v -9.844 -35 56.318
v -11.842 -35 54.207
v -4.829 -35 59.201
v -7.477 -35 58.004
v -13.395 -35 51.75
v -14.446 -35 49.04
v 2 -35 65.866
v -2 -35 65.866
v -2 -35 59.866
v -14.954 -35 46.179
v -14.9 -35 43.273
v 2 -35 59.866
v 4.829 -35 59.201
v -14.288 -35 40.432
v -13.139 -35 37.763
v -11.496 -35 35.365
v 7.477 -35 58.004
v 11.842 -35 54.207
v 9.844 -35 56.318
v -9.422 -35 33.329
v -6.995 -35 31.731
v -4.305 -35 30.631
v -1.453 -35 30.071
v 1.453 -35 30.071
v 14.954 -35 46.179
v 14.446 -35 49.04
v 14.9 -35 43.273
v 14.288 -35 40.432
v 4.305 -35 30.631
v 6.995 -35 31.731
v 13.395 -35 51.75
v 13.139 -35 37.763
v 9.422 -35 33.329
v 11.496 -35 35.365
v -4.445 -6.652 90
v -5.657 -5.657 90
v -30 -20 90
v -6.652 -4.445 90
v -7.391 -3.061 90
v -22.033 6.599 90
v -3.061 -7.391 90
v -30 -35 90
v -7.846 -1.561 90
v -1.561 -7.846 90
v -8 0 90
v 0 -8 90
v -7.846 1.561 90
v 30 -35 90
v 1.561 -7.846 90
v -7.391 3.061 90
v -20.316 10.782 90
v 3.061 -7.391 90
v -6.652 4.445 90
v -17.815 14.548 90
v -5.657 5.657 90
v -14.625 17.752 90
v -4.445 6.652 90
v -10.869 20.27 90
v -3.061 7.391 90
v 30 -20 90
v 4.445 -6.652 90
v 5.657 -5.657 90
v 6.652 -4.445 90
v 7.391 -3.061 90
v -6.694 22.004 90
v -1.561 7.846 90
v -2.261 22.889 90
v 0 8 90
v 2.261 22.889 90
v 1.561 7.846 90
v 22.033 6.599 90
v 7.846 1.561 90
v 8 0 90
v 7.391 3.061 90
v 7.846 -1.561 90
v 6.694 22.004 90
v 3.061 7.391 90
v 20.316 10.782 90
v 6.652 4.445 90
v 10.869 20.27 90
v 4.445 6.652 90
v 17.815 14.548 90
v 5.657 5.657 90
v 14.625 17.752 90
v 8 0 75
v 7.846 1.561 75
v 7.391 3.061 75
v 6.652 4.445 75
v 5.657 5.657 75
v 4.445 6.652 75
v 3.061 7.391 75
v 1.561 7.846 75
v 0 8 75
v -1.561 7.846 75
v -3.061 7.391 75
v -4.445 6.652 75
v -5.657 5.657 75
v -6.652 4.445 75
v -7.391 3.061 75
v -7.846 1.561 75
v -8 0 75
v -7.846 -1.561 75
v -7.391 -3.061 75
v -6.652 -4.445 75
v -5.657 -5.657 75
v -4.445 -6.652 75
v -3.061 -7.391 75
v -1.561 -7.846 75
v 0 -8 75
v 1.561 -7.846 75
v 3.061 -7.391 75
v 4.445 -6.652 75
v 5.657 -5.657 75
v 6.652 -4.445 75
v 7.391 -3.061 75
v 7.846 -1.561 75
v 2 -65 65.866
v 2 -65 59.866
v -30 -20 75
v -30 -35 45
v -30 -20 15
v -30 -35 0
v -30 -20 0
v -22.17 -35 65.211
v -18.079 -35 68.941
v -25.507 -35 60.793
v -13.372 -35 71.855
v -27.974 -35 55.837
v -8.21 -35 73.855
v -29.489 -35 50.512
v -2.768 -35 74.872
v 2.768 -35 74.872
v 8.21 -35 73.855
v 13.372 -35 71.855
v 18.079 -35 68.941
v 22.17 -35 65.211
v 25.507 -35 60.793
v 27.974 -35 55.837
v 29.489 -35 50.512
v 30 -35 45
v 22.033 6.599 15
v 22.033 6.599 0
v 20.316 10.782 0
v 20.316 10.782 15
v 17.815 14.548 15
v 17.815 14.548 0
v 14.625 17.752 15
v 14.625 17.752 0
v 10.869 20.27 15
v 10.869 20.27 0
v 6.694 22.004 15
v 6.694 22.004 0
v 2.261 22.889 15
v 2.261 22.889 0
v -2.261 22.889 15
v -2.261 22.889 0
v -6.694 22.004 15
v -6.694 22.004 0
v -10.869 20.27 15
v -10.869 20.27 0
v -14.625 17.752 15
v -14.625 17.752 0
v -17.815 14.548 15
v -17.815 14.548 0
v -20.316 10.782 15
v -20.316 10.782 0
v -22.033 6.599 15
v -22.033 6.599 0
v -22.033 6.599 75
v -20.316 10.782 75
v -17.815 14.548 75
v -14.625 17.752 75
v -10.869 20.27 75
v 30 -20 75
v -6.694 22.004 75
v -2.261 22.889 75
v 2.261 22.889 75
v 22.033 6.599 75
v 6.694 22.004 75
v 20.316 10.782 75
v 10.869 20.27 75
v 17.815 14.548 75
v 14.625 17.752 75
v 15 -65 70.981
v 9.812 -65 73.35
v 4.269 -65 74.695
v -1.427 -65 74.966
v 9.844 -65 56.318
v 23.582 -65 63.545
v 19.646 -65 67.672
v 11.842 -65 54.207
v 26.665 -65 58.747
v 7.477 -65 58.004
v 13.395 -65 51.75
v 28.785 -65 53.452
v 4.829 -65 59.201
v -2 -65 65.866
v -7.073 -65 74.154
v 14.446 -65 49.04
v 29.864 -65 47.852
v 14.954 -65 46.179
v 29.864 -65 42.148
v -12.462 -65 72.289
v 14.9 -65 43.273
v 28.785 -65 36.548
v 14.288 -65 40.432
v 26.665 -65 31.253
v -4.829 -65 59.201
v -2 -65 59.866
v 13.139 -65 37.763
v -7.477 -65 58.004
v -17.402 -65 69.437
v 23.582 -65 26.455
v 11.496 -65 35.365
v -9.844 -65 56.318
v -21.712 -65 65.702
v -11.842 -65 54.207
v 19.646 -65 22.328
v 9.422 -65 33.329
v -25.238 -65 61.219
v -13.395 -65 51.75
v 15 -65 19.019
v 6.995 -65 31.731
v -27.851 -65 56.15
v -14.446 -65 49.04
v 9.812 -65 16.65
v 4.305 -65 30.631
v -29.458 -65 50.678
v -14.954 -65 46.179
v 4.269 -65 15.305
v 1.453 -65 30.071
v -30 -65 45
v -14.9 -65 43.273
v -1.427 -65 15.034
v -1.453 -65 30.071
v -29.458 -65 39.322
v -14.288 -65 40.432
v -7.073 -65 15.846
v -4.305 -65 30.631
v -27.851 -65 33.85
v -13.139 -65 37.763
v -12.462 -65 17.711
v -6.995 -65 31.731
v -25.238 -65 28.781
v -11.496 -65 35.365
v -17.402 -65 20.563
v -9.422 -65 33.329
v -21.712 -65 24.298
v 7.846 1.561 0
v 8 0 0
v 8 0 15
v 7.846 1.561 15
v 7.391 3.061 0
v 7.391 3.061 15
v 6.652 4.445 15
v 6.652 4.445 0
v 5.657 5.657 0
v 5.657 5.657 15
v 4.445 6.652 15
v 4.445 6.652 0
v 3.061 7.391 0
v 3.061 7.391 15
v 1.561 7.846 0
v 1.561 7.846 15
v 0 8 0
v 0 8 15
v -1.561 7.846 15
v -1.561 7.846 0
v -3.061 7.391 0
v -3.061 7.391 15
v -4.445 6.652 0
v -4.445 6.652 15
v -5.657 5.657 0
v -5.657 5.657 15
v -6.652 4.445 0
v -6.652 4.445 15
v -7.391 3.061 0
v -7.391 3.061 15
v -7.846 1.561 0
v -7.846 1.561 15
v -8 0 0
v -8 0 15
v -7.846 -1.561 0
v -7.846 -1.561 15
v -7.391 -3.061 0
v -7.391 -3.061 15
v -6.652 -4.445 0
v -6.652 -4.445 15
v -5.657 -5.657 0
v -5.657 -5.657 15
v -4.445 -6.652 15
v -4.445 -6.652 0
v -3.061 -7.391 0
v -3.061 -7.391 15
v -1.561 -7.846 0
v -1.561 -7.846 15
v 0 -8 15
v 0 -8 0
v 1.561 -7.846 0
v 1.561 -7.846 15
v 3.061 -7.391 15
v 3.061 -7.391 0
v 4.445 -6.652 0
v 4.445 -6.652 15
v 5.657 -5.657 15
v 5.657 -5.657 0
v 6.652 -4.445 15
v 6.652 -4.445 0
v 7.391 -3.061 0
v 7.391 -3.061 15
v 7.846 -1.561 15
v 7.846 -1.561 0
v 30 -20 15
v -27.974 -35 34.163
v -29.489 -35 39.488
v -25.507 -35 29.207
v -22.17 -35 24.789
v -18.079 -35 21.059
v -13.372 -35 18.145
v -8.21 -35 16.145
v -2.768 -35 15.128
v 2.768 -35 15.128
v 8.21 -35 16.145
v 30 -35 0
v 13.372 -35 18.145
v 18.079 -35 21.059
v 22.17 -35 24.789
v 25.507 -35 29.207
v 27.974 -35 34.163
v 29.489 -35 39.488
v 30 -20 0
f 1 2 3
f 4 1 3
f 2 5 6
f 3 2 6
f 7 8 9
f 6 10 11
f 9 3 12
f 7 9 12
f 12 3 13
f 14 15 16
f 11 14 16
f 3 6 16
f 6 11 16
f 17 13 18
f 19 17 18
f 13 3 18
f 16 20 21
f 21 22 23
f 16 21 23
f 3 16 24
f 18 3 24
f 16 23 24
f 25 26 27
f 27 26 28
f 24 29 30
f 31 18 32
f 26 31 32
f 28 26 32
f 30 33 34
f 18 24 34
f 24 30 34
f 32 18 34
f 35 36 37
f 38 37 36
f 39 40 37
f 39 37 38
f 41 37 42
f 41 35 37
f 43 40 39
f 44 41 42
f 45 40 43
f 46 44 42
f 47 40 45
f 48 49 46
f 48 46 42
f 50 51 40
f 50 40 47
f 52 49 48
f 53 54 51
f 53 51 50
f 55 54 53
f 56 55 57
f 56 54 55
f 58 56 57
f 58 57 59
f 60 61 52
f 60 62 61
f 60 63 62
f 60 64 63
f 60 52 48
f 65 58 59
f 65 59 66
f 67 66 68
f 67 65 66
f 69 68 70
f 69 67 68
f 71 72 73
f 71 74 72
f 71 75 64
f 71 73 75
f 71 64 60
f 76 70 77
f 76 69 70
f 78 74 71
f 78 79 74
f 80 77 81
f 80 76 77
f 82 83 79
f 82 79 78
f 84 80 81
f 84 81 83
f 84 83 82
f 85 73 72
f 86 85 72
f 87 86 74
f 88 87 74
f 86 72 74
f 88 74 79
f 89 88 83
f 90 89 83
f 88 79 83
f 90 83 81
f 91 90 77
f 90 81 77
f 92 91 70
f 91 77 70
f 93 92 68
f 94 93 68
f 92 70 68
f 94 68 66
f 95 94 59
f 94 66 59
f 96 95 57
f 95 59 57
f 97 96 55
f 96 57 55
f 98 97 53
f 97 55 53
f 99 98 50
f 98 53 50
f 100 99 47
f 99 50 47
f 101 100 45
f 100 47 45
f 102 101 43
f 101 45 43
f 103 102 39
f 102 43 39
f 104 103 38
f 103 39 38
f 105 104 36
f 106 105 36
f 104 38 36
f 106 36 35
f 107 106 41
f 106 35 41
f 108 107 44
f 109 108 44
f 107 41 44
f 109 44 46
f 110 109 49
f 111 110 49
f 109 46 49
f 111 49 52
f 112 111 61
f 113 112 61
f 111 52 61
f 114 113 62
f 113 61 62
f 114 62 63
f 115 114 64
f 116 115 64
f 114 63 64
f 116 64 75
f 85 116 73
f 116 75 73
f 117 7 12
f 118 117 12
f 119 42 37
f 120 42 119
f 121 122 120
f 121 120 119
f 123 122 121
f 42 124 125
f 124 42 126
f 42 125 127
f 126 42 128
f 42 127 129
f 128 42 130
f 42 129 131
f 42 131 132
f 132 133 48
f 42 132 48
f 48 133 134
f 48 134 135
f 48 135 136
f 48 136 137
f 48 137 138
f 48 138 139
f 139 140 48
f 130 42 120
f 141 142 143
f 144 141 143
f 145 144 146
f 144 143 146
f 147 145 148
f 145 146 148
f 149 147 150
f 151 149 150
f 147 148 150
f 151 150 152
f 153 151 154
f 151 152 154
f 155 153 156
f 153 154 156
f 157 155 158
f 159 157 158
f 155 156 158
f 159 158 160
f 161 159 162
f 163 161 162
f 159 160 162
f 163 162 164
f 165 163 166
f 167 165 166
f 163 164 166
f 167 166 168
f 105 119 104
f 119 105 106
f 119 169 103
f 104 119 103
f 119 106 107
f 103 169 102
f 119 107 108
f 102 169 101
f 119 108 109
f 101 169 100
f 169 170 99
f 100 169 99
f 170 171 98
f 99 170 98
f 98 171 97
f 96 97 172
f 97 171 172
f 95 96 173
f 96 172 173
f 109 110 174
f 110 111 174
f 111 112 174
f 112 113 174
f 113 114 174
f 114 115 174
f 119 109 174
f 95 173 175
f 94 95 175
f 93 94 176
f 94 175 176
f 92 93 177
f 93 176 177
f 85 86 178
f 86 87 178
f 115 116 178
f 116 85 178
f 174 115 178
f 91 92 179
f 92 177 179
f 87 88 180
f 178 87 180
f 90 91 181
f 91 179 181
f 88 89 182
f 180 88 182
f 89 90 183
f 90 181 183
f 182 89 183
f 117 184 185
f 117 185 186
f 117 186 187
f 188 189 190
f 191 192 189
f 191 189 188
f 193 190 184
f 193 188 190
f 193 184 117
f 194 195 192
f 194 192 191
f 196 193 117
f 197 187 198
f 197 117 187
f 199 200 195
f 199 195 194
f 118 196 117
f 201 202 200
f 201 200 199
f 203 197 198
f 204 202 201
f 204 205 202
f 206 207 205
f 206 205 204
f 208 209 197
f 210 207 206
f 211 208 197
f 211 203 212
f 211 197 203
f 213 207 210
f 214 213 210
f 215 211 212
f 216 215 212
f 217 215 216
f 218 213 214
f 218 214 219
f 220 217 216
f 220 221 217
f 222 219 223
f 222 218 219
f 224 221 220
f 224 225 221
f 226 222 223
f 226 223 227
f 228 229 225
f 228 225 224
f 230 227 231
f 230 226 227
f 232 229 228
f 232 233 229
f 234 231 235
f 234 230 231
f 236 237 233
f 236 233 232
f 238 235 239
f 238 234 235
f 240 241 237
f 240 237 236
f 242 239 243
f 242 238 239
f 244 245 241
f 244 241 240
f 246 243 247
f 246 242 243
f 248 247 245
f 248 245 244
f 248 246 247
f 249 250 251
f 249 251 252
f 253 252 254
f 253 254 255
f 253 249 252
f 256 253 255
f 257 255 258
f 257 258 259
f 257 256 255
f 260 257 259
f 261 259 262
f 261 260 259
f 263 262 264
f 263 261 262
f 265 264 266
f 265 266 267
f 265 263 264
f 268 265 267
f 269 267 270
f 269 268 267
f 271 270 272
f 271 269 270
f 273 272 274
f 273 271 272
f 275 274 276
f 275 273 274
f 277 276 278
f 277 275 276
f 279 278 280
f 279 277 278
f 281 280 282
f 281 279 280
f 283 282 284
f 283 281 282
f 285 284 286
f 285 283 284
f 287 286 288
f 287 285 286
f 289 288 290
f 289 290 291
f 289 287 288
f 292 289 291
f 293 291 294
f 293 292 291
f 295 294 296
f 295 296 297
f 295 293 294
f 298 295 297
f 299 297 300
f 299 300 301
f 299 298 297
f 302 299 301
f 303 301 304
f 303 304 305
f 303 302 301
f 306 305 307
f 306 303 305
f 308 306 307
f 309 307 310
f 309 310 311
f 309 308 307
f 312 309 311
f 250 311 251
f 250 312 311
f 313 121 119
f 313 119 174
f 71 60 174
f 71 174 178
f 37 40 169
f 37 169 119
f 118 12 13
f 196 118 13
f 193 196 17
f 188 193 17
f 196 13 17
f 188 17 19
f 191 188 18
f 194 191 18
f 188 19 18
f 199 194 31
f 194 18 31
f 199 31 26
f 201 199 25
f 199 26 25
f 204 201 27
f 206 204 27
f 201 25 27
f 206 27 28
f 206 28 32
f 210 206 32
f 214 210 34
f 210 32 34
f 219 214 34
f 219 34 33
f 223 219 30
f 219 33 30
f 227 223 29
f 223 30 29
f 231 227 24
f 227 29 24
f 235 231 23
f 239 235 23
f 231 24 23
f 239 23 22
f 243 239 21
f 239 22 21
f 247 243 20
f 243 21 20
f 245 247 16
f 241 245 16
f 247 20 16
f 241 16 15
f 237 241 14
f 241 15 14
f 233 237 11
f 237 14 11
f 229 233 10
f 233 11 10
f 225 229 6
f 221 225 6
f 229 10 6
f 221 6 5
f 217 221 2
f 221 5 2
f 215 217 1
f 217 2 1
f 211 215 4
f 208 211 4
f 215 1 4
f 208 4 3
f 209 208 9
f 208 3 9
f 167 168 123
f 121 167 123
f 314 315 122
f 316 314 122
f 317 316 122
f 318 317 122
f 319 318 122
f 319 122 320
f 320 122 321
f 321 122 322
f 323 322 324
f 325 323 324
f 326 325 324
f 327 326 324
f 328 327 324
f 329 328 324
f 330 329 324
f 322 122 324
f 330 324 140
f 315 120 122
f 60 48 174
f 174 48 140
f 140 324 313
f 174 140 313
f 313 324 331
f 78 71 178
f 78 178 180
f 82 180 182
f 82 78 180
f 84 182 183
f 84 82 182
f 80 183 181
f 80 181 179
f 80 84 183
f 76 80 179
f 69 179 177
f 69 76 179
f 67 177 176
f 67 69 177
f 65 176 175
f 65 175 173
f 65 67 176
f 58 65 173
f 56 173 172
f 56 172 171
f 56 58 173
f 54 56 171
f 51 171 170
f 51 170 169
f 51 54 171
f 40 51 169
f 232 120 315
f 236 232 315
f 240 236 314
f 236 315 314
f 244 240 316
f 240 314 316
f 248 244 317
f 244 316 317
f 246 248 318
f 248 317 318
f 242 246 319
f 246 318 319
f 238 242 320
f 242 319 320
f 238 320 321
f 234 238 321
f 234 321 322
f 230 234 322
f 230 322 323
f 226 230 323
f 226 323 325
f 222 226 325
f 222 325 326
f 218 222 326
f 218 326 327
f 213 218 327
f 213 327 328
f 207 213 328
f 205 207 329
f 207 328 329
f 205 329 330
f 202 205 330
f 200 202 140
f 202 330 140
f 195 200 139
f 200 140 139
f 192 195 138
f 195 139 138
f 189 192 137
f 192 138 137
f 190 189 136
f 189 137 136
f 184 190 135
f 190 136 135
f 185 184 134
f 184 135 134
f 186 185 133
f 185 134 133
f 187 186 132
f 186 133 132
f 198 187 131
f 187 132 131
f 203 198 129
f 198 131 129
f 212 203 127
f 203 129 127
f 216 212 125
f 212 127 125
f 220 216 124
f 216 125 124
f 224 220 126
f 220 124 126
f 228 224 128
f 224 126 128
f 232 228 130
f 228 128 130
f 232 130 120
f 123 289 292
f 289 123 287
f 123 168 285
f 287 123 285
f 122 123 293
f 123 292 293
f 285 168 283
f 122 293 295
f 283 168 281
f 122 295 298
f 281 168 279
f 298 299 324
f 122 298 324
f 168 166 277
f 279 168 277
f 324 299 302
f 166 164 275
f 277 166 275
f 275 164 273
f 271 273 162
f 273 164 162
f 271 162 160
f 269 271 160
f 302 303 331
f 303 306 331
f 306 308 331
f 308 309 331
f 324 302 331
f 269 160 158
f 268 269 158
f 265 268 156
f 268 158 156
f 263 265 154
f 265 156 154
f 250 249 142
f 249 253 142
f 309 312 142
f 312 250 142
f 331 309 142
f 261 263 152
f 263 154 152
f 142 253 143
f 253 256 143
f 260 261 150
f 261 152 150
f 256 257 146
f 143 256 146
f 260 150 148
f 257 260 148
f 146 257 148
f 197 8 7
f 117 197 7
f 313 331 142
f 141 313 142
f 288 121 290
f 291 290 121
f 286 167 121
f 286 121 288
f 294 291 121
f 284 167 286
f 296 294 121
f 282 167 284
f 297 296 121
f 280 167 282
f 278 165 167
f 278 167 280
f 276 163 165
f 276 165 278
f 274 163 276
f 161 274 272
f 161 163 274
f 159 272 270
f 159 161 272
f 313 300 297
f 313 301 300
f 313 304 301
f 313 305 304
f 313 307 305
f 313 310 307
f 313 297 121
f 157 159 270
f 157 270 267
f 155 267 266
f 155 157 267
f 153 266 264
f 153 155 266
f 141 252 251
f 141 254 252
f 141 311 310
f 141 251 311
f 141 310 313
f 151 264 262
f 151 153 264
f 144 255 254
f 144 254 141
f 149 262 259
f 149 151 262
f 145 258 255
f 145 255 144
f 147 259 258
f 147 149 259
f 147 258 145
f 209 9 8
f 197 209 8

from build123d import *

# Parameters (mm, degrees)
SKETCH1_W           = 60
SKETCH1_H           = 15
BOSS_EXTRUDE1_DEPTH = 90
SKETCH1_3_R         = 8
BOSS_EXTRUDE2_DEPTH = 15
SKETCH2_R           = 30
BOSS_EXTRUDE3_DEPTH = 30


with BuildPart() as part:
    # Sketch1 → Boss-Extrude1 (new body)
    with BuildSketch(Plane.XY):
        with Locations((0, -27.5)):
            Rectangle(SKETCH1_W, SKETCH1_H)
    extrude(amount=BOSS_EXTRUDE1_DEPTH)

    # Sketch1<3> → Boss-Extrude2 (add)
    with BuildSketch(Plane.XY):
        with BuildLine():
            ThreePointArc((22.03289839, 6.599347585), (0, 23), (-22.03289839, 6.599347585))
            Line((-22.03289839, 6.599347585), (-30, -20))
            Line((-30, -20), (30, -20))
            Line((30, -20), (22.03289839, 6.599347585))
        make_face()
        Circle(SKETCH1_3_R, mode=Mode.SUBTRACT)
    boss_extrude2 = extrude(amount=BOSS_EXTRUDE2_DEPTH)

    # Mirror1: Boss-Extrude2 across plane
    add(boss_extrude2.mirror(Plane.XY.offset(45)))

    # Sketch2 → Boss-Extrude3 (add)
    with BuildSketch(Plane.XZ.offset(35)):
        with Locations((0, 45)):
            Circle(SKETCH2_R)
        with BuildLine():
            Line((-2, 59.866068747), (-2, 65.866068747))
            Line((-2, 65.866068747), (2, 65.866068747))
            Line((2, 65.866068747), (2, 59.866068747))
            ThreePointArc((2, 59.866068747), (0, 30), (-2, 59.866068747))
        make_face(mode=Mode.SUBTRACT)
    extrude(amount=BOSS_EXTRUDE3_DEPTH)


solid = part.part
